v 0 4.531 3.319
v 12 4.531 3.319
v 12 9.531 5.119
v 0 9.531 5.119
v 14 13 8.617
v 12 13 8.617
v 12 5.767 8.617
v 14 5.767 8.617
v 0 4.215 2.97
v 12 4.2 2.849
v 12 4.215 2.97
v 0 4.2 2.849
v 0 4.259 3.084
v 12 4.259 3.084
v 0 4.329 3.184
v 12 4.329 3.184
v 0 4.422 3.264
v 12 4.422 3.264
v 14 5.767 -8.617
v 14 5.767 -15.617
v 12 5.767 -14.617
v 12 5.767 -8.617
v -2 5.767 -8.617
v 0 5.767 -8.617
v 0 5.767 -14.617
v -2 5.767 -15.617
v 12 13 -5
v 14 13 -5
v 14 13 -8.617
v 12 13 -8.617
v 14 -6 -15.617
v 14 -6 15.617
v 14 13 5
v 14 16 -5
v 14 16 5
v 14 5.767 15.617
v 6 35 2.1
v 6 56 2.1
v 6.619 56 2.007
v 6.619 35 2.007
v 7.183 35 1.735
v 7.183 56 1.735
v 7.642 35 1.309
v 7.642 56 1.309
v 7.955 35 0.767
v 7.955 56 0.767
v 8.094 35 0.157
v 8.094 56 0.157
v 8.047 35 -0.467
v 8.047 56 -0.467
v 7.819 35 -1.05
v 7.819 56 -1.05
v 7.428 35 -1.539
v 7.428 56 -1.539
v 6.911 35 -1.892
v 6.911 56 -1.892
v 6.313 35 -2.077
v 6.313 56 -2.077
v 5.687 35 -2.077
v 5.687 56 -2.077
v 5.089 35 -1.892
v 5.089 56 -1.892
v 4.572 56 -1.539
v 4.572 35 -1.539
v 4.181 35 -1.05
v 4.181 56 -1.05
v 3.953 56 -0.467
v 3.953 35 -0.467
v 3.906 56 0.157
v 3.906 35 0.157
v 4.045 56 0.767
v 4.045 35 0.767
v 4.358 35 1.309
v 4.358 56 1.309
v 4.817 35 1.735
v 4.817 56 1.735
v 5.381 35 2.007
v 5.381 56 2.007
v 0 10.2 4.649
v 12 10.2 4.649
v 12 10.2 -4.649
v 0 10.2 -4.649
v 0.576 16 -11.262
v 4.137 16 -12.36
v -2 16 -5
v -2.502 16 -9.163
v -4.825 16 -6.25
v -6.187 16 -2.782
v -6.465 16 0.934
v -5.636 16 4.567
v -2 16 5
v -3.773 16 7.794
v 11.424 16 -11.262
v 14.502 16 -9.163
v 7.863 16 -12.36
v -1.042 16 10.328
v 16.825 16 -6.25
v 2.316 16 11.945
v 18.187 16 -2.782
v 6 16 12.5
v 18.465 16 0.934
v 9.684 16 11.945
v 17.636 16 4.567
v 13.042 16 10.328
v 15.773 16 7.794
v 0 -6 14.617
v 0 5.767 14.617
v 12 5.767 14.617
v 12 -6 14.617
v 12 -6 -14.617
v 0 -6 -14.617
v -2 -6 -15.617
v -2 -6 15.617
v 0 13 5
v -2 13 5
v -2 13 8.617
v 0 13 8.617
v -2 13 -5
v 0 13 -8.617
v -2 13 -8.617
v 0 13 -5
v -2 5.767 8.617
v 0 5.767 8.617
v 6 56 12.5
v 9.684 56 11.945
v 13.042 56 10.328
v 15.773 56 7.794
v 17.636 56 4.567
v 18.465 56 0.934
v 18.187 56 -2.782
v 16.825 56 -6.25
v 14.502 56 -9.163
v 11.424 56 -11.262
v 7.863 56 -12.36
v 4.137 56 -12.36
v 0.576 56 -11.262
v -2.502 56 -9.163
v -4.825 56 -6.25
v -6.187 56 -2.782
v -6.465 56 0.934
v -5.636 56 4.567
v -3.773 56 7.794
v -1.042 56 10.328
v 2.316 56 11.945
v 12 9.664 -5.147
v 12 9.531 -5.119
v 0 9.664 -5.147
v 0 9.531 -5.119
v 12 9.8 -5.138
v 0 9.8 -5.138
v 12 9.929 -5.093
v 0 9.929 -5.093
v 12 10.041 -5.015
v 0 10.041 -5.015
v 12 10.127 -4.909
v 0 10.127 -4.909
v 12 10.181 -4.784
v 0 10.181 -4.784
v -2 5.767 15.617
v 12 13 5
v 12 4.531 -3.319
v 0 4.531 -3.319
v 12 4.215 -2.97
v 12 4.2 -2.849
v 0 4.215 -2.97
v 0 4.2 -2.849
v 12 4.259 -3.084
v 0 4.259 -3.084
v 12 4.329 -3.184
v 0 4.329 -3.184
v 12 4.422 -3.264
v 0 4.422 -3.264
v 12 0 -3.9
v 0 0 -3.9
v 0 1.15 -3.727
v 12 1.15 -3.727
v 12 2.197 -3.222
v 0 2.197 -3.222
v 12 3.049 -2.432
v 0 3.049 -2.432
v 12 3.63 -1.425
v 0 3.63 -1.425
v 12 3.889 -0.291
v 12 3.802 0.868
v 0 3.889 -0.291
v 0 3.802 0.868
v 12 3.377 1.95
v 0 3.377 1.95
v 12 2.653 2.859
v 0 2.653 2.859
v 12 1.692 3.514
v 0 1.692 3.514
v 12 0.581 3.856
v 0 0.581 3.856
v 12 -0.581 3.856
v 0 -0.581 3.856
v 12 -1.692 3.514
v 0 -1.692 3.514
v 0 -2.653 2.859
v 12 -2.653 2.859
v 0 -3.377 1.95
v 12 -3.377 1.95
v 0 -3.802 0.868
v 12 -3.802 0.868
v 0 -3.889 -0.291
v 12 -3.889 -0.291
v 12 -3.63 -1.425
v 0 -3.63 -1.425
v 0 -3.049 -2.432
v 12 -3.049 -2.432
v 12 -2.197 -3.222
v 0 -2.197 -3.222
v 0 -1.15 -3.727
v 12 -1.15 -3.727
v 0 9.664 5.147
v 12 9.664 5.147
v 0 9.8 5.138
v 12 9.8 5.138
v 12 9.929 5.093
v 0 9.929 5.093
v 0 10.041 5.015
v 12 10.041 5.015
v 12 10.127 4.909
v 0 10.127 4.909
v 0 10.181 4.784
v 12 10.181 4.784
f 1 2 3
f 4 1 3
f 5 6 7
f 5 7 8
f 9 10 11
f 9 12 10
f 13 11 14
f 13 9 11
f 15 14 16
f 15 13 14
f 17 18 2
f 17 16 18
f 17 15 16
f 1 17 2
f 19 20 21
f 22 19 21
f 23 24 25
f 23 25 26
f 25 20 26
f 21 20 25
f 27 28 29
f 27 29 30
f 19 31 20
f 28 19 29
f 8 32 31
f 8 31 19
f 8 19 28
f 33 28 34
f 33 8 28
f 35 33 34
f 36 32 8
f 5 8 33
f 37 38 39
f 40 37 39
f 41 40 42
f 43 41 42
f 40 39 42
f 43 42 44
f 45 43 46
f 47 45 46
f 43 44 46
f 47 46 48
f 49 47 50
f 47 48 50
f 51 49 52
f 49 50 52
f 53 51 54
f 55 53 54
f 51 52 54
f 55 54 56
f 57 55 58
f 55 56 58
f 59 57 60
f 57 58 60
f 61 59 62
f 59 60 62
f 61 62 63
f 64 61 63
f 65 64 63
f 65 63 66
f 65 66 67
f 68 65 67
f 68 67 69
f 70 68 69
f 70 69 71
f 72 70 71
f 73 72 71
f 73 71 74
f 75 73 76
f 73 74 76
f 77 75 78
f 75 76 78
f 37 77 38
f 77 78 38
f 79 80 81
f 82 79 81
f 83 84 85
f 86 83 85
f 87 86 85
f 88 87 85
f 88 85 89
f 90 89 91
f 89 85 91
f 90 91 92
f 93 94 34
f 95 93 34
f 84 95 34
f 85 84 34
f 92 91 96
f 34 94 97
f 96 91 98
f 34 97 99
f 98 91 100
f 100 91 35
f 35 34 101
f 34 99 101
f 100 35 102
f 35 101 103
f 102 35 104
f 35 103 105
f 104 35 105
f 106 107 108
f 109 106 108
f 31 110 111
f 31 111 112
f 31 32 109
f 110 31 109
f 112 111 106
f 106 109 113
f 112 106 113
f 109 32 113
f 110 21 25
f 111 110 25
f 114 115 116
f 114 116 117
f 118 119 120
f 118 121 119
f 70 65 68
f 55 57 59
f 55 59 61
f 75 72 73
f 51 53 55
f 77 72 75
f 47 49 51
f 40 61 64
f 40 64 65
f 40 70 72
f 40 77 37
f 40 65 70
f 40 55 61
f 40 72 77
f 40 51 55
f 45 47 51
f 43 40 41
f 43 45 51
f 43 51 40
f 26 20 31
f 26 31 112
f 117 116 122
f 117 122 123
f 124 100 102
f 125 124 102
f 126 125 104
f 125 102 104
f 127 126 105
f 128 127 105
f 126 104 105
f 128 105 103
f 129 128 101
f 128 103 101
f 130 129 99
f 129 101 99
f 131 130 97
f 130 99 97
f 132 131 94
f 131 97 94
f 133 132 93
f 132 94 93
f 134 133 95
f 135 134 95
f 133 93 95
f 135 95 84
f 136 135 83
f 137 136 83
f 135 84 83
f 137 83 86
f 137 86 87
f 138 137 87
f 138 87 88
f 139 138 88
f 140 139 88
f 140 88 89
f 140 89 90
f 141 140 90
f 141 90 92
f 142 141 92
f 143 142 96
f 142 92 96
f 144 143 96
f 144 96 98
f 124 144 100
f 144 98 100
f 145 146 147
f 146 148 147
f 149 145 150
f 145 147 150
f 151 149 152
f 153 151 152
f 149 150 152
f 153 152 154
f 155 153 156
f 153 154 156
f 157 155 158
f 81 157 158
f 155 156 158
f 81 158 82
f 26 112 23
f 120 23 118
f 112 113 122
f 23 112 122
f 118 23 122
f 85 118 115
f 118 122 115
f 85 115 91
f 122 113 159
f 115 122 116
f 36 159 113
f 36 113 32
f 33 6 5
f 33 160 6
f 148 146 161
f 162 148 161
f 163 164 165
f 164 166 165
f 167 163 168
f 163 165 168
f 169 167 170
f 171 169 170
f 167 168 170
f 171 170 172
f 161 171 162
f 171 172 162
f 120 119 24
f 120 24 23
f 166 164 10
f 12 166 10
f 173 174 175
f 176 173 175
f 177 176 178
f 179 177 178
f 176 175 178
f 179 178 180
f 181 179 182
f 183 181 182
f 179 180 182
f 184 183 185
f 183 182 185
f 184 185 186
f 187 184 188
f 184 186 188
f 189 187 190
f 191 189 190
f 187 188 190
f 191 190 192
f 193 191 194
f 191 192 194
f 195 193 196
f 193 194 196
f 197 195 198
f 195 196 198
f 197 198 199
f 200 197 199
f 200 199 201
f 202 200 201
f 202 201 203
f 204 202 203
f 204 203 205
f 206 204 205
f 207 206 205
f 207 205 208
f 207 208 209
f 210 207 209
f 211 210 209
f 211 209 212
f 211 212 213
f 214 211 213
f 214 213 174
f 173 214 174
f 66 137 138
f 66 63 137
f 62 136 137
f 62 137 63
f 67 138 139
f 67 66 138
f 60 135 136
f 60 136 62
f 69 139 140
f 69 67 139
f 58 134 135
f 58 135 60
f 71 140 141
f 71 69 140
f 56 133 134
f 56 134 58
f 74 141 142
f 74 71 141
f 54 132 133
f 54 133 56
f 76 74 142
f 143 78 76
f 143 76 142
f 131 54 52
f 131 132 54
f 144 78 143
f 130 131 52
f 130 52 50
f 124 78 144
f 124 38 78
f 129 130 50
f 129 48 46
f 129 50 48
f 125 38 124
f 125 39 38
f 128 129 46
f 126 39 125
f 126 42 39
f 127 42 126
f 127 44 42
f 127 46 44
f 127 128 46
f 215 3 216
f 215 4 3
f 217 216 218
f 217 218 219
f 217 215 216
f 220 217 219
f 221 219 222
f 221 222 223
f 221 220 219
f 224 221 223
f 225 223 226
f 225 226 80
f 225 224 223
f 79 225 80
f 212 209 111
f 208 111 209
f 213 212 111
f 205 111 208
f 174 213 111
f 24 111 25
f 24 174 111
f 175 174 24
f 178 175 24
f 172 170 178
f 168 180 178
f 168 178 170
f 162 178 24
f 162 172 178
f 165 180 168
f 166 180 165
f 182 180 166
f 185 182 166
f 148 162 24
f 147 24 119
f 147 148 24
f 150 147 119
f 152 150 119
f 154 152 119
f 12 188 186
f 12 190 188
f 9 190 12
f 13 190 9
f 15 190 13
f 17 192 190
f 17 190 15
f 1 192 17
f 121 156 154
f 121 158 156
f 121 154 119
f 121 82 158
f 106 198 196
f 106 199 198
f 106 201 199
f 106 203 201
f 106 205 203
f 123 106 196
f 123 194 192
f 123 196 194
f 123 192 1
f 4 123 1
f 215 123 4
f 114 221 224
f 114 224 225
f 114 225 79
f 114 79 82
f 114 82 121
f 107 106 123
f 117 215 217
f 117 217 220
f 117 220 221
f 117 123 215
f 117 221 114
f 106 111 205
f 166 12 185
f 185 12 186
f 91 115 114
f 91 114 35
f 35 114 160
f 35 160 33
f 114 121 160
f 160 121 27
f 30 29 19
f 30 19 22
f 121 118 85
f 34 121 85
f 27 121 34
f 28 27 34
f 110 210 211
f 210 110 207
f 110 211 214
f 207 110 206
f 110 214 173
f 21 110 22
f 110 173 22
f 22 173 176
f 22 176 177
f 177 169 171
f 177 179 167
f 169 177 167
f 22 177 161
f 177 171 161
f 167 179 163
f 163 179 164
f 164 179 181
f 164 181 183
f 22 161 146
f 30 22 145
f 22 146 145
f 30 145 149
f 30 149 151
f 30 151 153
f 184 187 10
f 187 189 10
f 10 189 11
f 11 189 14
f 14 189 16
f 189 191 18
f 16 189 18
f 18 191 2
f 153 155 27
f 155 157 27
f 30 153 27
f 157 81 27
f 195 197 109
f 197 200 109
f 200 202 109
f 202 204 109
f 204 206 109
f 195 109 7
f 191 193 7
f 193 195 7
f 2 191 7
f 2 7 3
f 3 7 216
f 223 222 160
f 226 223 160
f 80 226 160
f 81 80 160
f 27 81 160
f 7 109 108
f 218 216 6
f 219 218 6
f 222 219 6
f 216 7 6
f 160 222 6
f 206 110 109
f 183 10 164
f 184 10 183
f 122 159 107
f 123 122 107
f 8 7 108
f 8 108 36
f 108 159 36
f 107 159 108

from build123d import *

# Parameters (mm, degrees)
SKETCH2_R            = 3.9
BOSS_EXTRUDE1_DEPTH  = 12
SKETCH3_R            = 6
BOSS_EXTRUDE2_DEPTH  = 2
BOSS_EXTRUDE3_START  = 2
SKETCH4_R            = 6
BOSS_EXTRUDE3_DEPTH  = 2
SKETCH5_W            = 19.497175456
SKETCH5_H            = 13.883202756
CUT_EXTRUDE1_DEPTH   = 5
SKETCH6_W            = 2
SKETCH6_H            = 6.63324958
BOSS_EXTRUDE4_DEPTH  = 8
SKETCH7_W            = 16
SKETCH7_H            = 10
BOSS_EXTRUDE5_DEPTH  = 3
SKETCH8_R            = 12.5
BOSS_EXTRUDE6_DEPTH  = 40
SKETCH10_R           = 2.1
CUT_EXTRUDE2_DEPTH   = 21
BOSS_EXTRUDE7_DEPTH  = 12
FILLET1_R            = 0.5
SKETCH11_W           = 2
SKETCH11_H           = 19
BOSS_EXTRUDE8_DEPTH  = 11.3
SKETCH13_W           = 2
SKETCH13_H           = 19
BOSS_EXTRUDE9_DEPTH  = 11.3
SKETCH14_W           = 16
SKETCH14_H           = 19
BOSS_EXTRUDE10_DEPTH = 1
SKETCH15_W           = 16
SKETCH15_H           = 19
BOSS_EXTRUDE11_DEPTH = 1
SKETCH16_W           = 16
SKETCH16_H           = 7.233308129
CUT_EXTRUDE3_DEPTH   = 7
SKETCH17_W           = 16
SKETCH17_H           = 7.233308129
CUT_EXTRUDE4_DEPTH   = 7
SKETCH18_W           = 2
SKETCH18_H           = 1
BOSS_EXTRUDE12_DEPTH = 6.633249581
SKETCH19_W           = 2
SKETCH19_H           = 1
BOSS_EXTRUDE13_DEPTH = 6.633249581


with BuildPart() as part:
    # Sketch2 → Boss-Extrude1 (new body)
    with BuildSketch(Plane(origin=(0, 0, 0), x_dir=(0, 0, -1), z_dir=(1, 0, 0))):
        Circle(SKETCH2_R)
    extrude(amount=BOSS_EXTRUDE1_DEPTH)

    # Sketch3 → Boss-Extrude2 (add)
    with BuildSketch(Plane(origin=(12, 0, 0), x_dir=(0, 0, -1), z_dir=(1, 0, 0))):
        Circle(SKETCH3_R)
    extrude(amount=BOSS_EXTRUDE2_DEPTH)

    # Sketch4 → Boss-Extrude3 (add)
    with BuildSketch(Plane.ZY.offset(BOSS_EXTRUDE3_START)):
        with Locations(Location((0, 0, 0), (0, 0, 180))):
            Circle(SKETCH4_R)
    extrude(amount=-BOSS_EXTRUDE3_DEPTH)

    # Sketch5 → Cut-Extrude1 (cut)
    with BuildSketch(Plane(origin=(0, 5, 0), x_dir=(1, 0, 0), z_dir=(0, 1, 0))):
        with Locations((6.056898372, 0.369839418)):
            Rectangle(SKETCH5_W, SKETCH5_H)
    extrude(amount=CUT_EXTRUDE1_DEPTH, mode=Mode.SUBTRACT)

    # Sketch6 → Boss-Extrude4 (add)
    with BuildSketch(Plane(origin=(0, 5, 0), x_dir=(1, 0, 0), z_dir=(0, 1, 0))):
        with Locations((13, 0)):
            Rectangle(SKETCH6_W, SKETCH6_H)
        with Locations((-1, 0)):
            Rectangle(SKETCH6_W, SKETCH6_H)
    extrude(amount=BOSS_EXTRUDE4_DEPTH)

    # Sketch7 → Boss-Extrude5 (add)
    with BuildSketch(Plane(origin=(0, 13, 0), x_dir=(1, 0, 0), z_dir=(0, 1, 0))):
        with Locations((6, 0)):
            Rectangle(SKETCH7_W, SKETCH7_H)
    extrude(amount=BOSS_EXTRUDE5_DEPTH)

    # Sketch8 → Boss-Extrude6 (add)
    with BuildSketch(Plane(origin=(0, 16, 0), x_dir=(1, 0, 0), z_dir=(0, 1, 0))):
        with Locations(Location((6, 0, 0), (0, 0, 270))):
            Circle(SKETCH8_R)
    extrude(amount=BOSS_EXTRUDE6_DEPTH)

    # Sketch10 → Cut-Extrude2 (cut)
    with BuildSketch(Plane(origin=(0, 56, 0), x_dir=(1, 0, 0), z_dir=(0, 1, 0))):
        with Locations(Location((6, 0, 0), (0, 0, 270))):
            Circle(SKETCH10_R)
    extrude(amount=-CUT_EXTRUDE2_DEPTH, mode=Mode.SUBTRACT)

    # Sketch12 → Boss-Extrude7 (add)
    with BuildSketch(Plane.ZY.offset(-12)):
        Polygon((-3.2, 4.2), (3.2, 4.2), (5, 9.2), (5.36, 10.2), (-5.36, 10.2), (-5, 9.2), align=None)
    extrude(amount=BOSS_EXTRUDE7_DEPTH)

    # Fillet1
    fillet1_edges = [part.edges().sort_by_distance(p)[0] for p in [
        (6, 4.2, -3.2),
        (6, 4.2, 3.2),
        (6, 10.2, 5.36),
        (6, 10.2, -5.36),
    ]]
    fillet(fillet1_edges, radius=FILLET1_R)

    # Sketch11 → Boss-Extrude8 (add)
    with BuildSketch(Plane.XY.offset(3.31662479)):
        with Locations((13, 3.5)):
            Rectangle(SKETCH11_W, SKETCH11_H)
        with Locations((-1, 3.5)):
            Rectangle(SKETCH11_W, SKETCH11_H)
    extrude(amount=BOSS_EXTRUDE8_DEPTH)

    # Sketch13 → Boss-Extrude9 (add)
    with BuildSketch(Plane(origin=(0, 0, -3.31662479), x_dir=(-1, 0, 0), z_dir=(0, 0, -1))):
        with Locations((-13, 3.5)):
            Rectangle(SKETCH13_W, SKETCH13_H)
        with Locations((1, 3.5)):
            Rectangle(SKETCH13_W, SKETCH13_H)
    extrude(amount=BOSS_EXTRUDE9_DEPTH)

    # Sketch14 → Boss-Extrude10 (add)
    with BuildSketch(Plane.XY.offset(14.61662479)):
        with Locations((6, 3.5)):
            Rectangle(SKETCH14_W, SKETCH14_H)
    extrude(amount=BOSS_EXTRUDE10_DEPTH)

    # Sketch15 → Boss-Extrude11 (add)
    with BuildSketch(Plane(origin=(0, 0, -14.61662479), x_dir=(-1, 0, 0), z_dir=(0, 0, -1))):
        with Locations((-6, 3.5)):
            Rectangle(SKETCH15_W, SKETCH15_H)
    extrude(amount=BOSS_EXTRUDE11_DEPTH)

    # Sketch16 → Cut-Extrude3 (cut)
    with BuildSketch(Plane(origin=(0, 0, -15.61662479), x_dir=(-1, 0, 0), z_dir=(0, 0, -1))):
        with Locations((-6, 9.383345935)):
            Rectangle(SKETCH16_W, SKETCH16_H)
    extrude(amount=-CUT_EXTRUDE3_DEPTH, mode=Mode.SUBTRACT)

    # Sketch17 → Cut-Extrude4 (cut)
    with BuildSketch(Plane.XY.offset(15.61662479)):
        with Locations((6, 9.383345935)):
            Rectangle(SKETCH17_W, SKETCH17_H)
    extrude(amount=-CUT_EXTRUDE4_DEPTH, mode=Mode.SUBTRACT)

    # Sketch18 → Boss-Extrude12 (add)
    with BuildSketch(Plane(origin=(0, 0, 3.31662479), x_dir=(-1, 0, 0), z_dir=(0, 0, -1))):
        with Locations((-13, -5.5)):
            Rectangle(SKETCH18_W, SKETCH18_H)
    extrude(amount=BOSS_EXTRUDE12_DEPTH)

    # Sketch19 → Boss-Extrude13 (add)
    with BuildSketch(Plane(origin=(0, 0, 3.31662479), x_dir=(-1, 0, 0), z_dir=(0, 0, -1))):
        with Locations((1, -5.5)):
            Rectangle(SKETCH19_W, SKETCH19_H)
    extrude(amount=BOSS_EXTRUDE13_DEPTH)


solid = part.part
